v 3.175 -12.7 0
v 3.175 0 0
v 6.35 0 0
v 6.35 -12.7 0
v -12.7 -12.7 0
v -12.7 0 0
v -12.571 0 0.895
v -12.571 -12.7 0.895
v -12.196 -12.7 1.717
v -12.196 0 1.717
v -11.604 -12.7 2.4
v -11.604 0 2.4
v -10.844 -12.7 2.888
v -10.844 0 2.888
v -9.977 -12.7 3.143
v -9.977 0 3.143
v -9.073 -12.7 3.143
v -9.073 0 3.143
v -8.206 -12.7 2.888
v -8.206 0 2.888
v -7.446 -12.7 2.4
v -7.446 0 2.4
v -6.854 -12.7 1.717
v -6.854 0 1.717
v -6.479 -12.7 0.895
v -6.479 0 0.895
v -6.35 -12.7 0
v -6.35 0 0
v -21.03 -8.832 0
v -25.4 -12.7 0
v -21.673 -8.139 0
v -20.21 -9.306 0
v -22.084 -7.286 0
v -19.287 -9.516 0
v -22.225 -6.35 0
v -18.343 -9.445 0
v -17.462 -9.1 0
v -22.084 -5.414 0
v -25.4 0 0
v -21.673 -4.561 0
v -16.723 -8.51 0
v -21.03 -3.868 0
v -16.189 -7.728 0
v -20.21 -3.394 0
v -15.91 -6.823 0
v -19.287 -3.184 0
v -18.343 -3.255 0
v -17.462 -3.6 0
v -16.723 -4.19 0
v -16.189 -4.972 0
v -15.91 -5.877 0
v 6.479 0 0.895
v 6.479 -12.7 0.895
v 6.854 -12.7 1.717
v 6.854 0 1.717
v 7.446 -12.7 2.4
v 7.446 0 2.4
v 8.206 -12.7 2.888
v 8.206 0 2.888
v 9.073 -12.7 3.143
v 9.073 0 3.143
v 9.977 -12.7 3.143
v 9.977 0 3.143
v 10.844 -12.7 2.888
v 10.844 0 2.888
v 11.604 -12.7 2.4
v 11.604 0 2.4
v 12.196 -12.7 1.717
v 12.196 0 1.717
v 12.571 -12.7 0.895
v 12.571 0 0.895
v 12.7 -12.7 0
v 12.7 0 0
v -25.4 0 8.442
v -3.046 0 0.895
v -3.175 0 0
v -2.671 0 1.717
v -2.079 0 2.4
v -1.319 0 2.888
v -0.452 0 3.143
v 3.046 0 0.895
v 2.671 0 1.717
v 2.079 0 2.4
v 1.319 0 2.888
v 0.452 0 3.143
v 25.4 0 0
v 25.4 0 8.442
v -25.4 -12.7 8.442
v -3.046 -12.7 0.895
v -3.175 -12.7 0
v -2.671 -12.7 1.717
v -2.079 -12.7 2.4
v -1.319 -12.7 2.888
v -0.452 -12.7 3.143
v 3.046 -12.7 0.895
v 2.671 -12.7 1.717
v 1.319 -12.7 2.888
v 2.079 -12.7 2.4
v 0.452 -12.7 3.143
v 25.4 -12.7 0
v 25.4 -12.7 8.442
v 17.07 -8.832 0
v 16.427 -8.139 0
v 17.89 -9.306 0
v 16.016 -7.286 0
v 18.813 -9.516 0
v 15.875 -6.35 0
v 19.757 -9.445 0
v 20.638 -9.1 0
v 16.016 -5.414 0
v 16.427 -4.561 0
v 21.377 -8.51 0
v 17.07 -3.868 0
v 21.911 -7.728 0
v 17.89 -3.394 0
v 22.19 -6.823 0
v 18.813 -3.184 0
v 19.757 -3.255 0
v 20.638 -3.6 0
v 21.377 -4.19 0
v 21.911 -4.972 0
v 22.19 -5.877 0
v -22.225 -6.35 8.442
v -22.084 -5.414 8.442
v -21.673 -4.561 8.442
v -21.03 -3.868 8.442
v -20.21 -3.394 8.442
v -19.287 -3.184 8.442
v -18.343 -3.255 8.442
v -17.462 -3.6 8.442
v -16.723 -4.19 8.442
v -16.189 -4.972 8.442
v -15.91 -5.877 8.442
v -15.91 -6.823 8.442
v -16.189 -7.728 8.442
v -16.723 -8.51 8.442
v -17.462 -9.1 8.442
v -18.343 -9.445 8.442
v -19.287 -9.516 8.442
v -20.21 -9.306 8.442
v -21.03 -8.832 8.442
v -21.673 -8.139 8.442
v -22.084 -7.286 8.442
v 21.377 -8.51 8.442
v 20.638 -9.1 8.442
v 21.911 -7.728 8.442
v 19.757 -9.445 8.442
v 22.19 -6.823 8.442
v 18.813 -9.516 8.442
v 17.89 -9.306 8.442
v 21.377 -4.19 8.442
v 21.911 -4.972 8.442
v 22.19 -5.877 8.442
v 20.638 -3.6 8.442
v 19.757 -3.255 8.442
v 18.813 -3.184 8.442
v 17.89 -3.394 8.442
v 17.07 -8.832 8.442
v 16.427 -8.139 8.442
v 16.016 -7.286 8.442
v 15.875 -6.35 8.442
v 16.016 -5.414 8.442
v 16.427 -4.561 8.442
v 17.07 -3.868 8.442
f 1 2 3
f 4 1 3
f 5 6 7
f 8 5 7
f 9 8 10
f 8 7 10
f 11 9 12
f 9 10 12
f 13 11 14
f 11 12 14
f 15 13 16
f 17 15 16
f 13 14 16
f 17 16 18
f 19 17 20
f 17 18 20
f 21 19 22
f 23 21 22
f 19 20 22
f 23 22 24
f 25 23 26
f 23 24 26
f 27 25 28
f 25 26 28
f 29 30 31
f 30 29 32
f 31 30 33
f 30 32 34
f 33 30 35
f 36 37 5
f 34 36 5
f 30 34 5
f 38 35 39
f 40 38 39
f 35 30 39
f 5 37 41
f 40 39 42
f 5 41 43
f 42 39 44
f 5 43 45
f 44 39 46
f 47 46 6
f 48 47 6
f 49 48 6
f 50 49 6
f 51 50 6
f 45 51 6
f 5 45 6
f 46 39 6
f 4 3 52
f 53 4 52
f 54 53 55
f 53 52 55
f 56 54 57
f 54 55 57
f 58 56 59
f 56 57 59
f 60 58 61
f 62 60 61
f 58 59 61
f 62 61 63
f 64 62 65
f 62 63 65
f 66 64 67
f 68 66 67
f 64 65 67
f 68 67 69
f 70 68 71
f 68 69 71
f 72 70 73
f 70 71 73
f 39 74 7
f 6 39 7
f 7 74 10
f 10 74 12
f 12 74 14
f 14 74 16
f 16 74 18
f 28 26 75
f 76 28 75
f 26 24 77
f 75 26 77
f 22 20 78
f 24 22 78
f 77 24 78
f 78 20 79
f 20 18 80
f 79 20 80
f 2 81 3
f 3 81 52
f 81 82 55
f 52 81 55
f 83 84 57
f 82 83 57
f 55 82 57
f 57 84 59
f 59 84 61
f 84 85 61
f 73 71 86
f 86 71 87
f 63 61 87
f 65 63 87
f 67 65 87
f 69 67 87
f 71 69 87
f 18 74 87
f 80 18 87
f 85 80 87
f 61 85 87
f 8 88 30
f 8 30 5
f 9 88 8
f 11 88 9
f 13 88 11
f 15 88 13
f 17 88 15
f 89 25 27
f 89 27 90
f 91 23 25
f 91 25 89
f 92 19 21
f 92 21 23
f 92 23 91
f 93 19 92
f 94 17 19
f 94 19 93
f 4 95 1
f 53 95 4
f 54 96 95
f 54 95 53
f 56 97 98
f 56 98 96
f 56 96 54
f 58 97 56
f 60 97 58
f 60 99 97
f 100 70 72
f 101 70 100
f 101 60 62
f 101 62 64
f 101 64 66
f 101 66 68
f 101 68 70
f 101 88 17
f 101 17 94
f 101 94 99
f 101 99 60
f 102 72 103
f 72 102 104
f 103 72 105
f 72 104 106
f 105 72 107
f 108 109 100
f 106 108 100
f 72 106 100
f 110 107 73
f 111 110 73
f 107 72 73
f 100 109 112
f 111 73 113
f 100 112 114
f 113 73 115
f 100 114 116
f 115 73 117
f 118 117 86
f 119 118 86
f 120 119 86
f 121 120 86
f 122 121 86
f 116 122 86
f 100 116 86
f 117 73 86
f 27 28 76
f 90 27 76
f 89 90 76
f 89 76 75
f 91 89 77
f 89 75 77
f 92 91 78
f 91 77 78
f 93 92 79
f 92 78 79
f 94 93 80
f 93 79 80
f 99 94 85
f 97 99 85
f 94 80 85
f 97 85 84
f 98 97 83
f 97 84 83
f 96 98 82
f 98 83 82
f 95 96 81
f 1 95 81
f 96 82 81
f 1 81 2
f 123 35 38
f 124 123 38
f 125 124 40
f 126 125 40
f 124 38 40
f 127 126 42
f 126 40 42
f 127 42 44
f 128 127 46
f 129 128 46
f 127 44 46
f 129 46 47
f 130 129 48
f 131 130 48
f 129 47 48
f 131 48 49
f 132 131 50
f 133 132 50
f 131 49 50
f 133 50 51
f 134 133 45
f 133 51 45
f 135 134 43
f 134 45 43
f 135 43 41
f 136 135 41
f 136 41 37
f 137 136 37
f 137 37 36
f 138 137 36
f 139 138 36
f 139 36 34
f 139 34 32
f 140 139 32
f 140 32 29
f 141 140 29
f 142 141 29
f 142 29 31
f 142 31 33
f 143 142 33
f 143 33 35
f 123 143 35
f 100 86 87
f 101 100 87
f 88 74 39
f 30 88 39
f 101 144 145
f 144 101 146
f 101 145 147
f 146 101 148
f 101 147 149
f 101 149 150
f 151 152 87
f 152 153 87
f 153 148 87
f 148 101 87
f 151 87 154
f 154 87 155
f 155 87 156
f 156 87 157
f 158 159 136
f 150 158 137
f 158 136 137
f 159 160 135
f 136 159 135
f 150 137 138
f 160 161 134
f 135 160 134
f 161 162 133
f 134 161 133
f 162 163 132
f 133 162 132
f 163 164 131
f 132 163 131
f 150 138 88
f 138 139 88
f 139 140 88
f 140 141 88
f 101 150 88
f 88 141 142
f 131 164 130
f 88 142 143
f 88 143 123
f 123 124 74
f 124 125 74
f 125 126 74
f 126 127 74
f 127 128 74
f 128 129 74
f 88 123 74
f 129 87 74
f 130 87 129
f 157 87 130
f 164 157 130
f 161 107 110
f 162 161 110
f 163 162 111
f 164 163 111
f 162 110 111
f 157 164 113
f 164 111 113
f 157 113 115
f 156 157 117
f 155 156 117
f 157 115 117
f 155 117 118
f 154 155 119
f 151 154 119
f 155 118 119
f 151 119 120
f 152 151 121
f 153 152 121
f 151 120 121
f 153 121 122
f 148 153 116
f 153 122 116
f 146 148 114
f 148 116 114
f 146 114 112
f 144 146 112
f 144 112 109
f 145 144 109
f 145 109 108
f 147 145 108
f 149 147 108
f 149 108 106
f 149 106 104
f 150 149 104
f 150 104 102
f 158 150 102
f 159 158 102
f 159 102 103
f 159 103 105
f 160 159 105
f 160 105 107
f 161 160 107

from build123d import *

# Parameters (mm, degrees)
F2_DEPTH = 12.7
F4_D     = 6.35


# Not quite as in the source:
# - a variable given as a bare number and used for a length is read in inches; the dataset says mm whatever the document's units were


with BuildPart() as f2:
    # F1 (on Front) → F2 (new body)
    with BuildSketch(Plane.XZ):
        with BuildLine():
            Line((-25.4, 8.4416426996), (-25.4, 0))
            Line((-25.4, 0), (-12.7, 0))
            ThreePointArc((-12.7, 0), (-9.525, 3.175), (-6.35, 0))
            Line((-6.35, 0), (-3.175, 0))
            ThreePointArc((-3.175, 0), (0, 3.175), (3.175, 0))
            Line((3.175, 0), (6.35, 0))
            ThreePointArc((6.35, 0), (9.525, 3.175), (12.7, 0))
            Line((12.7, 0), (25.4, 0))
            Line((25.4, 0), (25.4, 8.4416426996))
            Line((25.4, 8.4416426996), (-25.4, 8.4416426996))
        make_face()
    extrude(amount=F2_DEPTH)

    # F4 (through all)
    with Locations(Plane.XY.offset(8.4416426996)):
        with Locations((-19.05, -6.35), (19.05, -6.35)):
            Hole(F4_D / 2)


solid = f2.part
